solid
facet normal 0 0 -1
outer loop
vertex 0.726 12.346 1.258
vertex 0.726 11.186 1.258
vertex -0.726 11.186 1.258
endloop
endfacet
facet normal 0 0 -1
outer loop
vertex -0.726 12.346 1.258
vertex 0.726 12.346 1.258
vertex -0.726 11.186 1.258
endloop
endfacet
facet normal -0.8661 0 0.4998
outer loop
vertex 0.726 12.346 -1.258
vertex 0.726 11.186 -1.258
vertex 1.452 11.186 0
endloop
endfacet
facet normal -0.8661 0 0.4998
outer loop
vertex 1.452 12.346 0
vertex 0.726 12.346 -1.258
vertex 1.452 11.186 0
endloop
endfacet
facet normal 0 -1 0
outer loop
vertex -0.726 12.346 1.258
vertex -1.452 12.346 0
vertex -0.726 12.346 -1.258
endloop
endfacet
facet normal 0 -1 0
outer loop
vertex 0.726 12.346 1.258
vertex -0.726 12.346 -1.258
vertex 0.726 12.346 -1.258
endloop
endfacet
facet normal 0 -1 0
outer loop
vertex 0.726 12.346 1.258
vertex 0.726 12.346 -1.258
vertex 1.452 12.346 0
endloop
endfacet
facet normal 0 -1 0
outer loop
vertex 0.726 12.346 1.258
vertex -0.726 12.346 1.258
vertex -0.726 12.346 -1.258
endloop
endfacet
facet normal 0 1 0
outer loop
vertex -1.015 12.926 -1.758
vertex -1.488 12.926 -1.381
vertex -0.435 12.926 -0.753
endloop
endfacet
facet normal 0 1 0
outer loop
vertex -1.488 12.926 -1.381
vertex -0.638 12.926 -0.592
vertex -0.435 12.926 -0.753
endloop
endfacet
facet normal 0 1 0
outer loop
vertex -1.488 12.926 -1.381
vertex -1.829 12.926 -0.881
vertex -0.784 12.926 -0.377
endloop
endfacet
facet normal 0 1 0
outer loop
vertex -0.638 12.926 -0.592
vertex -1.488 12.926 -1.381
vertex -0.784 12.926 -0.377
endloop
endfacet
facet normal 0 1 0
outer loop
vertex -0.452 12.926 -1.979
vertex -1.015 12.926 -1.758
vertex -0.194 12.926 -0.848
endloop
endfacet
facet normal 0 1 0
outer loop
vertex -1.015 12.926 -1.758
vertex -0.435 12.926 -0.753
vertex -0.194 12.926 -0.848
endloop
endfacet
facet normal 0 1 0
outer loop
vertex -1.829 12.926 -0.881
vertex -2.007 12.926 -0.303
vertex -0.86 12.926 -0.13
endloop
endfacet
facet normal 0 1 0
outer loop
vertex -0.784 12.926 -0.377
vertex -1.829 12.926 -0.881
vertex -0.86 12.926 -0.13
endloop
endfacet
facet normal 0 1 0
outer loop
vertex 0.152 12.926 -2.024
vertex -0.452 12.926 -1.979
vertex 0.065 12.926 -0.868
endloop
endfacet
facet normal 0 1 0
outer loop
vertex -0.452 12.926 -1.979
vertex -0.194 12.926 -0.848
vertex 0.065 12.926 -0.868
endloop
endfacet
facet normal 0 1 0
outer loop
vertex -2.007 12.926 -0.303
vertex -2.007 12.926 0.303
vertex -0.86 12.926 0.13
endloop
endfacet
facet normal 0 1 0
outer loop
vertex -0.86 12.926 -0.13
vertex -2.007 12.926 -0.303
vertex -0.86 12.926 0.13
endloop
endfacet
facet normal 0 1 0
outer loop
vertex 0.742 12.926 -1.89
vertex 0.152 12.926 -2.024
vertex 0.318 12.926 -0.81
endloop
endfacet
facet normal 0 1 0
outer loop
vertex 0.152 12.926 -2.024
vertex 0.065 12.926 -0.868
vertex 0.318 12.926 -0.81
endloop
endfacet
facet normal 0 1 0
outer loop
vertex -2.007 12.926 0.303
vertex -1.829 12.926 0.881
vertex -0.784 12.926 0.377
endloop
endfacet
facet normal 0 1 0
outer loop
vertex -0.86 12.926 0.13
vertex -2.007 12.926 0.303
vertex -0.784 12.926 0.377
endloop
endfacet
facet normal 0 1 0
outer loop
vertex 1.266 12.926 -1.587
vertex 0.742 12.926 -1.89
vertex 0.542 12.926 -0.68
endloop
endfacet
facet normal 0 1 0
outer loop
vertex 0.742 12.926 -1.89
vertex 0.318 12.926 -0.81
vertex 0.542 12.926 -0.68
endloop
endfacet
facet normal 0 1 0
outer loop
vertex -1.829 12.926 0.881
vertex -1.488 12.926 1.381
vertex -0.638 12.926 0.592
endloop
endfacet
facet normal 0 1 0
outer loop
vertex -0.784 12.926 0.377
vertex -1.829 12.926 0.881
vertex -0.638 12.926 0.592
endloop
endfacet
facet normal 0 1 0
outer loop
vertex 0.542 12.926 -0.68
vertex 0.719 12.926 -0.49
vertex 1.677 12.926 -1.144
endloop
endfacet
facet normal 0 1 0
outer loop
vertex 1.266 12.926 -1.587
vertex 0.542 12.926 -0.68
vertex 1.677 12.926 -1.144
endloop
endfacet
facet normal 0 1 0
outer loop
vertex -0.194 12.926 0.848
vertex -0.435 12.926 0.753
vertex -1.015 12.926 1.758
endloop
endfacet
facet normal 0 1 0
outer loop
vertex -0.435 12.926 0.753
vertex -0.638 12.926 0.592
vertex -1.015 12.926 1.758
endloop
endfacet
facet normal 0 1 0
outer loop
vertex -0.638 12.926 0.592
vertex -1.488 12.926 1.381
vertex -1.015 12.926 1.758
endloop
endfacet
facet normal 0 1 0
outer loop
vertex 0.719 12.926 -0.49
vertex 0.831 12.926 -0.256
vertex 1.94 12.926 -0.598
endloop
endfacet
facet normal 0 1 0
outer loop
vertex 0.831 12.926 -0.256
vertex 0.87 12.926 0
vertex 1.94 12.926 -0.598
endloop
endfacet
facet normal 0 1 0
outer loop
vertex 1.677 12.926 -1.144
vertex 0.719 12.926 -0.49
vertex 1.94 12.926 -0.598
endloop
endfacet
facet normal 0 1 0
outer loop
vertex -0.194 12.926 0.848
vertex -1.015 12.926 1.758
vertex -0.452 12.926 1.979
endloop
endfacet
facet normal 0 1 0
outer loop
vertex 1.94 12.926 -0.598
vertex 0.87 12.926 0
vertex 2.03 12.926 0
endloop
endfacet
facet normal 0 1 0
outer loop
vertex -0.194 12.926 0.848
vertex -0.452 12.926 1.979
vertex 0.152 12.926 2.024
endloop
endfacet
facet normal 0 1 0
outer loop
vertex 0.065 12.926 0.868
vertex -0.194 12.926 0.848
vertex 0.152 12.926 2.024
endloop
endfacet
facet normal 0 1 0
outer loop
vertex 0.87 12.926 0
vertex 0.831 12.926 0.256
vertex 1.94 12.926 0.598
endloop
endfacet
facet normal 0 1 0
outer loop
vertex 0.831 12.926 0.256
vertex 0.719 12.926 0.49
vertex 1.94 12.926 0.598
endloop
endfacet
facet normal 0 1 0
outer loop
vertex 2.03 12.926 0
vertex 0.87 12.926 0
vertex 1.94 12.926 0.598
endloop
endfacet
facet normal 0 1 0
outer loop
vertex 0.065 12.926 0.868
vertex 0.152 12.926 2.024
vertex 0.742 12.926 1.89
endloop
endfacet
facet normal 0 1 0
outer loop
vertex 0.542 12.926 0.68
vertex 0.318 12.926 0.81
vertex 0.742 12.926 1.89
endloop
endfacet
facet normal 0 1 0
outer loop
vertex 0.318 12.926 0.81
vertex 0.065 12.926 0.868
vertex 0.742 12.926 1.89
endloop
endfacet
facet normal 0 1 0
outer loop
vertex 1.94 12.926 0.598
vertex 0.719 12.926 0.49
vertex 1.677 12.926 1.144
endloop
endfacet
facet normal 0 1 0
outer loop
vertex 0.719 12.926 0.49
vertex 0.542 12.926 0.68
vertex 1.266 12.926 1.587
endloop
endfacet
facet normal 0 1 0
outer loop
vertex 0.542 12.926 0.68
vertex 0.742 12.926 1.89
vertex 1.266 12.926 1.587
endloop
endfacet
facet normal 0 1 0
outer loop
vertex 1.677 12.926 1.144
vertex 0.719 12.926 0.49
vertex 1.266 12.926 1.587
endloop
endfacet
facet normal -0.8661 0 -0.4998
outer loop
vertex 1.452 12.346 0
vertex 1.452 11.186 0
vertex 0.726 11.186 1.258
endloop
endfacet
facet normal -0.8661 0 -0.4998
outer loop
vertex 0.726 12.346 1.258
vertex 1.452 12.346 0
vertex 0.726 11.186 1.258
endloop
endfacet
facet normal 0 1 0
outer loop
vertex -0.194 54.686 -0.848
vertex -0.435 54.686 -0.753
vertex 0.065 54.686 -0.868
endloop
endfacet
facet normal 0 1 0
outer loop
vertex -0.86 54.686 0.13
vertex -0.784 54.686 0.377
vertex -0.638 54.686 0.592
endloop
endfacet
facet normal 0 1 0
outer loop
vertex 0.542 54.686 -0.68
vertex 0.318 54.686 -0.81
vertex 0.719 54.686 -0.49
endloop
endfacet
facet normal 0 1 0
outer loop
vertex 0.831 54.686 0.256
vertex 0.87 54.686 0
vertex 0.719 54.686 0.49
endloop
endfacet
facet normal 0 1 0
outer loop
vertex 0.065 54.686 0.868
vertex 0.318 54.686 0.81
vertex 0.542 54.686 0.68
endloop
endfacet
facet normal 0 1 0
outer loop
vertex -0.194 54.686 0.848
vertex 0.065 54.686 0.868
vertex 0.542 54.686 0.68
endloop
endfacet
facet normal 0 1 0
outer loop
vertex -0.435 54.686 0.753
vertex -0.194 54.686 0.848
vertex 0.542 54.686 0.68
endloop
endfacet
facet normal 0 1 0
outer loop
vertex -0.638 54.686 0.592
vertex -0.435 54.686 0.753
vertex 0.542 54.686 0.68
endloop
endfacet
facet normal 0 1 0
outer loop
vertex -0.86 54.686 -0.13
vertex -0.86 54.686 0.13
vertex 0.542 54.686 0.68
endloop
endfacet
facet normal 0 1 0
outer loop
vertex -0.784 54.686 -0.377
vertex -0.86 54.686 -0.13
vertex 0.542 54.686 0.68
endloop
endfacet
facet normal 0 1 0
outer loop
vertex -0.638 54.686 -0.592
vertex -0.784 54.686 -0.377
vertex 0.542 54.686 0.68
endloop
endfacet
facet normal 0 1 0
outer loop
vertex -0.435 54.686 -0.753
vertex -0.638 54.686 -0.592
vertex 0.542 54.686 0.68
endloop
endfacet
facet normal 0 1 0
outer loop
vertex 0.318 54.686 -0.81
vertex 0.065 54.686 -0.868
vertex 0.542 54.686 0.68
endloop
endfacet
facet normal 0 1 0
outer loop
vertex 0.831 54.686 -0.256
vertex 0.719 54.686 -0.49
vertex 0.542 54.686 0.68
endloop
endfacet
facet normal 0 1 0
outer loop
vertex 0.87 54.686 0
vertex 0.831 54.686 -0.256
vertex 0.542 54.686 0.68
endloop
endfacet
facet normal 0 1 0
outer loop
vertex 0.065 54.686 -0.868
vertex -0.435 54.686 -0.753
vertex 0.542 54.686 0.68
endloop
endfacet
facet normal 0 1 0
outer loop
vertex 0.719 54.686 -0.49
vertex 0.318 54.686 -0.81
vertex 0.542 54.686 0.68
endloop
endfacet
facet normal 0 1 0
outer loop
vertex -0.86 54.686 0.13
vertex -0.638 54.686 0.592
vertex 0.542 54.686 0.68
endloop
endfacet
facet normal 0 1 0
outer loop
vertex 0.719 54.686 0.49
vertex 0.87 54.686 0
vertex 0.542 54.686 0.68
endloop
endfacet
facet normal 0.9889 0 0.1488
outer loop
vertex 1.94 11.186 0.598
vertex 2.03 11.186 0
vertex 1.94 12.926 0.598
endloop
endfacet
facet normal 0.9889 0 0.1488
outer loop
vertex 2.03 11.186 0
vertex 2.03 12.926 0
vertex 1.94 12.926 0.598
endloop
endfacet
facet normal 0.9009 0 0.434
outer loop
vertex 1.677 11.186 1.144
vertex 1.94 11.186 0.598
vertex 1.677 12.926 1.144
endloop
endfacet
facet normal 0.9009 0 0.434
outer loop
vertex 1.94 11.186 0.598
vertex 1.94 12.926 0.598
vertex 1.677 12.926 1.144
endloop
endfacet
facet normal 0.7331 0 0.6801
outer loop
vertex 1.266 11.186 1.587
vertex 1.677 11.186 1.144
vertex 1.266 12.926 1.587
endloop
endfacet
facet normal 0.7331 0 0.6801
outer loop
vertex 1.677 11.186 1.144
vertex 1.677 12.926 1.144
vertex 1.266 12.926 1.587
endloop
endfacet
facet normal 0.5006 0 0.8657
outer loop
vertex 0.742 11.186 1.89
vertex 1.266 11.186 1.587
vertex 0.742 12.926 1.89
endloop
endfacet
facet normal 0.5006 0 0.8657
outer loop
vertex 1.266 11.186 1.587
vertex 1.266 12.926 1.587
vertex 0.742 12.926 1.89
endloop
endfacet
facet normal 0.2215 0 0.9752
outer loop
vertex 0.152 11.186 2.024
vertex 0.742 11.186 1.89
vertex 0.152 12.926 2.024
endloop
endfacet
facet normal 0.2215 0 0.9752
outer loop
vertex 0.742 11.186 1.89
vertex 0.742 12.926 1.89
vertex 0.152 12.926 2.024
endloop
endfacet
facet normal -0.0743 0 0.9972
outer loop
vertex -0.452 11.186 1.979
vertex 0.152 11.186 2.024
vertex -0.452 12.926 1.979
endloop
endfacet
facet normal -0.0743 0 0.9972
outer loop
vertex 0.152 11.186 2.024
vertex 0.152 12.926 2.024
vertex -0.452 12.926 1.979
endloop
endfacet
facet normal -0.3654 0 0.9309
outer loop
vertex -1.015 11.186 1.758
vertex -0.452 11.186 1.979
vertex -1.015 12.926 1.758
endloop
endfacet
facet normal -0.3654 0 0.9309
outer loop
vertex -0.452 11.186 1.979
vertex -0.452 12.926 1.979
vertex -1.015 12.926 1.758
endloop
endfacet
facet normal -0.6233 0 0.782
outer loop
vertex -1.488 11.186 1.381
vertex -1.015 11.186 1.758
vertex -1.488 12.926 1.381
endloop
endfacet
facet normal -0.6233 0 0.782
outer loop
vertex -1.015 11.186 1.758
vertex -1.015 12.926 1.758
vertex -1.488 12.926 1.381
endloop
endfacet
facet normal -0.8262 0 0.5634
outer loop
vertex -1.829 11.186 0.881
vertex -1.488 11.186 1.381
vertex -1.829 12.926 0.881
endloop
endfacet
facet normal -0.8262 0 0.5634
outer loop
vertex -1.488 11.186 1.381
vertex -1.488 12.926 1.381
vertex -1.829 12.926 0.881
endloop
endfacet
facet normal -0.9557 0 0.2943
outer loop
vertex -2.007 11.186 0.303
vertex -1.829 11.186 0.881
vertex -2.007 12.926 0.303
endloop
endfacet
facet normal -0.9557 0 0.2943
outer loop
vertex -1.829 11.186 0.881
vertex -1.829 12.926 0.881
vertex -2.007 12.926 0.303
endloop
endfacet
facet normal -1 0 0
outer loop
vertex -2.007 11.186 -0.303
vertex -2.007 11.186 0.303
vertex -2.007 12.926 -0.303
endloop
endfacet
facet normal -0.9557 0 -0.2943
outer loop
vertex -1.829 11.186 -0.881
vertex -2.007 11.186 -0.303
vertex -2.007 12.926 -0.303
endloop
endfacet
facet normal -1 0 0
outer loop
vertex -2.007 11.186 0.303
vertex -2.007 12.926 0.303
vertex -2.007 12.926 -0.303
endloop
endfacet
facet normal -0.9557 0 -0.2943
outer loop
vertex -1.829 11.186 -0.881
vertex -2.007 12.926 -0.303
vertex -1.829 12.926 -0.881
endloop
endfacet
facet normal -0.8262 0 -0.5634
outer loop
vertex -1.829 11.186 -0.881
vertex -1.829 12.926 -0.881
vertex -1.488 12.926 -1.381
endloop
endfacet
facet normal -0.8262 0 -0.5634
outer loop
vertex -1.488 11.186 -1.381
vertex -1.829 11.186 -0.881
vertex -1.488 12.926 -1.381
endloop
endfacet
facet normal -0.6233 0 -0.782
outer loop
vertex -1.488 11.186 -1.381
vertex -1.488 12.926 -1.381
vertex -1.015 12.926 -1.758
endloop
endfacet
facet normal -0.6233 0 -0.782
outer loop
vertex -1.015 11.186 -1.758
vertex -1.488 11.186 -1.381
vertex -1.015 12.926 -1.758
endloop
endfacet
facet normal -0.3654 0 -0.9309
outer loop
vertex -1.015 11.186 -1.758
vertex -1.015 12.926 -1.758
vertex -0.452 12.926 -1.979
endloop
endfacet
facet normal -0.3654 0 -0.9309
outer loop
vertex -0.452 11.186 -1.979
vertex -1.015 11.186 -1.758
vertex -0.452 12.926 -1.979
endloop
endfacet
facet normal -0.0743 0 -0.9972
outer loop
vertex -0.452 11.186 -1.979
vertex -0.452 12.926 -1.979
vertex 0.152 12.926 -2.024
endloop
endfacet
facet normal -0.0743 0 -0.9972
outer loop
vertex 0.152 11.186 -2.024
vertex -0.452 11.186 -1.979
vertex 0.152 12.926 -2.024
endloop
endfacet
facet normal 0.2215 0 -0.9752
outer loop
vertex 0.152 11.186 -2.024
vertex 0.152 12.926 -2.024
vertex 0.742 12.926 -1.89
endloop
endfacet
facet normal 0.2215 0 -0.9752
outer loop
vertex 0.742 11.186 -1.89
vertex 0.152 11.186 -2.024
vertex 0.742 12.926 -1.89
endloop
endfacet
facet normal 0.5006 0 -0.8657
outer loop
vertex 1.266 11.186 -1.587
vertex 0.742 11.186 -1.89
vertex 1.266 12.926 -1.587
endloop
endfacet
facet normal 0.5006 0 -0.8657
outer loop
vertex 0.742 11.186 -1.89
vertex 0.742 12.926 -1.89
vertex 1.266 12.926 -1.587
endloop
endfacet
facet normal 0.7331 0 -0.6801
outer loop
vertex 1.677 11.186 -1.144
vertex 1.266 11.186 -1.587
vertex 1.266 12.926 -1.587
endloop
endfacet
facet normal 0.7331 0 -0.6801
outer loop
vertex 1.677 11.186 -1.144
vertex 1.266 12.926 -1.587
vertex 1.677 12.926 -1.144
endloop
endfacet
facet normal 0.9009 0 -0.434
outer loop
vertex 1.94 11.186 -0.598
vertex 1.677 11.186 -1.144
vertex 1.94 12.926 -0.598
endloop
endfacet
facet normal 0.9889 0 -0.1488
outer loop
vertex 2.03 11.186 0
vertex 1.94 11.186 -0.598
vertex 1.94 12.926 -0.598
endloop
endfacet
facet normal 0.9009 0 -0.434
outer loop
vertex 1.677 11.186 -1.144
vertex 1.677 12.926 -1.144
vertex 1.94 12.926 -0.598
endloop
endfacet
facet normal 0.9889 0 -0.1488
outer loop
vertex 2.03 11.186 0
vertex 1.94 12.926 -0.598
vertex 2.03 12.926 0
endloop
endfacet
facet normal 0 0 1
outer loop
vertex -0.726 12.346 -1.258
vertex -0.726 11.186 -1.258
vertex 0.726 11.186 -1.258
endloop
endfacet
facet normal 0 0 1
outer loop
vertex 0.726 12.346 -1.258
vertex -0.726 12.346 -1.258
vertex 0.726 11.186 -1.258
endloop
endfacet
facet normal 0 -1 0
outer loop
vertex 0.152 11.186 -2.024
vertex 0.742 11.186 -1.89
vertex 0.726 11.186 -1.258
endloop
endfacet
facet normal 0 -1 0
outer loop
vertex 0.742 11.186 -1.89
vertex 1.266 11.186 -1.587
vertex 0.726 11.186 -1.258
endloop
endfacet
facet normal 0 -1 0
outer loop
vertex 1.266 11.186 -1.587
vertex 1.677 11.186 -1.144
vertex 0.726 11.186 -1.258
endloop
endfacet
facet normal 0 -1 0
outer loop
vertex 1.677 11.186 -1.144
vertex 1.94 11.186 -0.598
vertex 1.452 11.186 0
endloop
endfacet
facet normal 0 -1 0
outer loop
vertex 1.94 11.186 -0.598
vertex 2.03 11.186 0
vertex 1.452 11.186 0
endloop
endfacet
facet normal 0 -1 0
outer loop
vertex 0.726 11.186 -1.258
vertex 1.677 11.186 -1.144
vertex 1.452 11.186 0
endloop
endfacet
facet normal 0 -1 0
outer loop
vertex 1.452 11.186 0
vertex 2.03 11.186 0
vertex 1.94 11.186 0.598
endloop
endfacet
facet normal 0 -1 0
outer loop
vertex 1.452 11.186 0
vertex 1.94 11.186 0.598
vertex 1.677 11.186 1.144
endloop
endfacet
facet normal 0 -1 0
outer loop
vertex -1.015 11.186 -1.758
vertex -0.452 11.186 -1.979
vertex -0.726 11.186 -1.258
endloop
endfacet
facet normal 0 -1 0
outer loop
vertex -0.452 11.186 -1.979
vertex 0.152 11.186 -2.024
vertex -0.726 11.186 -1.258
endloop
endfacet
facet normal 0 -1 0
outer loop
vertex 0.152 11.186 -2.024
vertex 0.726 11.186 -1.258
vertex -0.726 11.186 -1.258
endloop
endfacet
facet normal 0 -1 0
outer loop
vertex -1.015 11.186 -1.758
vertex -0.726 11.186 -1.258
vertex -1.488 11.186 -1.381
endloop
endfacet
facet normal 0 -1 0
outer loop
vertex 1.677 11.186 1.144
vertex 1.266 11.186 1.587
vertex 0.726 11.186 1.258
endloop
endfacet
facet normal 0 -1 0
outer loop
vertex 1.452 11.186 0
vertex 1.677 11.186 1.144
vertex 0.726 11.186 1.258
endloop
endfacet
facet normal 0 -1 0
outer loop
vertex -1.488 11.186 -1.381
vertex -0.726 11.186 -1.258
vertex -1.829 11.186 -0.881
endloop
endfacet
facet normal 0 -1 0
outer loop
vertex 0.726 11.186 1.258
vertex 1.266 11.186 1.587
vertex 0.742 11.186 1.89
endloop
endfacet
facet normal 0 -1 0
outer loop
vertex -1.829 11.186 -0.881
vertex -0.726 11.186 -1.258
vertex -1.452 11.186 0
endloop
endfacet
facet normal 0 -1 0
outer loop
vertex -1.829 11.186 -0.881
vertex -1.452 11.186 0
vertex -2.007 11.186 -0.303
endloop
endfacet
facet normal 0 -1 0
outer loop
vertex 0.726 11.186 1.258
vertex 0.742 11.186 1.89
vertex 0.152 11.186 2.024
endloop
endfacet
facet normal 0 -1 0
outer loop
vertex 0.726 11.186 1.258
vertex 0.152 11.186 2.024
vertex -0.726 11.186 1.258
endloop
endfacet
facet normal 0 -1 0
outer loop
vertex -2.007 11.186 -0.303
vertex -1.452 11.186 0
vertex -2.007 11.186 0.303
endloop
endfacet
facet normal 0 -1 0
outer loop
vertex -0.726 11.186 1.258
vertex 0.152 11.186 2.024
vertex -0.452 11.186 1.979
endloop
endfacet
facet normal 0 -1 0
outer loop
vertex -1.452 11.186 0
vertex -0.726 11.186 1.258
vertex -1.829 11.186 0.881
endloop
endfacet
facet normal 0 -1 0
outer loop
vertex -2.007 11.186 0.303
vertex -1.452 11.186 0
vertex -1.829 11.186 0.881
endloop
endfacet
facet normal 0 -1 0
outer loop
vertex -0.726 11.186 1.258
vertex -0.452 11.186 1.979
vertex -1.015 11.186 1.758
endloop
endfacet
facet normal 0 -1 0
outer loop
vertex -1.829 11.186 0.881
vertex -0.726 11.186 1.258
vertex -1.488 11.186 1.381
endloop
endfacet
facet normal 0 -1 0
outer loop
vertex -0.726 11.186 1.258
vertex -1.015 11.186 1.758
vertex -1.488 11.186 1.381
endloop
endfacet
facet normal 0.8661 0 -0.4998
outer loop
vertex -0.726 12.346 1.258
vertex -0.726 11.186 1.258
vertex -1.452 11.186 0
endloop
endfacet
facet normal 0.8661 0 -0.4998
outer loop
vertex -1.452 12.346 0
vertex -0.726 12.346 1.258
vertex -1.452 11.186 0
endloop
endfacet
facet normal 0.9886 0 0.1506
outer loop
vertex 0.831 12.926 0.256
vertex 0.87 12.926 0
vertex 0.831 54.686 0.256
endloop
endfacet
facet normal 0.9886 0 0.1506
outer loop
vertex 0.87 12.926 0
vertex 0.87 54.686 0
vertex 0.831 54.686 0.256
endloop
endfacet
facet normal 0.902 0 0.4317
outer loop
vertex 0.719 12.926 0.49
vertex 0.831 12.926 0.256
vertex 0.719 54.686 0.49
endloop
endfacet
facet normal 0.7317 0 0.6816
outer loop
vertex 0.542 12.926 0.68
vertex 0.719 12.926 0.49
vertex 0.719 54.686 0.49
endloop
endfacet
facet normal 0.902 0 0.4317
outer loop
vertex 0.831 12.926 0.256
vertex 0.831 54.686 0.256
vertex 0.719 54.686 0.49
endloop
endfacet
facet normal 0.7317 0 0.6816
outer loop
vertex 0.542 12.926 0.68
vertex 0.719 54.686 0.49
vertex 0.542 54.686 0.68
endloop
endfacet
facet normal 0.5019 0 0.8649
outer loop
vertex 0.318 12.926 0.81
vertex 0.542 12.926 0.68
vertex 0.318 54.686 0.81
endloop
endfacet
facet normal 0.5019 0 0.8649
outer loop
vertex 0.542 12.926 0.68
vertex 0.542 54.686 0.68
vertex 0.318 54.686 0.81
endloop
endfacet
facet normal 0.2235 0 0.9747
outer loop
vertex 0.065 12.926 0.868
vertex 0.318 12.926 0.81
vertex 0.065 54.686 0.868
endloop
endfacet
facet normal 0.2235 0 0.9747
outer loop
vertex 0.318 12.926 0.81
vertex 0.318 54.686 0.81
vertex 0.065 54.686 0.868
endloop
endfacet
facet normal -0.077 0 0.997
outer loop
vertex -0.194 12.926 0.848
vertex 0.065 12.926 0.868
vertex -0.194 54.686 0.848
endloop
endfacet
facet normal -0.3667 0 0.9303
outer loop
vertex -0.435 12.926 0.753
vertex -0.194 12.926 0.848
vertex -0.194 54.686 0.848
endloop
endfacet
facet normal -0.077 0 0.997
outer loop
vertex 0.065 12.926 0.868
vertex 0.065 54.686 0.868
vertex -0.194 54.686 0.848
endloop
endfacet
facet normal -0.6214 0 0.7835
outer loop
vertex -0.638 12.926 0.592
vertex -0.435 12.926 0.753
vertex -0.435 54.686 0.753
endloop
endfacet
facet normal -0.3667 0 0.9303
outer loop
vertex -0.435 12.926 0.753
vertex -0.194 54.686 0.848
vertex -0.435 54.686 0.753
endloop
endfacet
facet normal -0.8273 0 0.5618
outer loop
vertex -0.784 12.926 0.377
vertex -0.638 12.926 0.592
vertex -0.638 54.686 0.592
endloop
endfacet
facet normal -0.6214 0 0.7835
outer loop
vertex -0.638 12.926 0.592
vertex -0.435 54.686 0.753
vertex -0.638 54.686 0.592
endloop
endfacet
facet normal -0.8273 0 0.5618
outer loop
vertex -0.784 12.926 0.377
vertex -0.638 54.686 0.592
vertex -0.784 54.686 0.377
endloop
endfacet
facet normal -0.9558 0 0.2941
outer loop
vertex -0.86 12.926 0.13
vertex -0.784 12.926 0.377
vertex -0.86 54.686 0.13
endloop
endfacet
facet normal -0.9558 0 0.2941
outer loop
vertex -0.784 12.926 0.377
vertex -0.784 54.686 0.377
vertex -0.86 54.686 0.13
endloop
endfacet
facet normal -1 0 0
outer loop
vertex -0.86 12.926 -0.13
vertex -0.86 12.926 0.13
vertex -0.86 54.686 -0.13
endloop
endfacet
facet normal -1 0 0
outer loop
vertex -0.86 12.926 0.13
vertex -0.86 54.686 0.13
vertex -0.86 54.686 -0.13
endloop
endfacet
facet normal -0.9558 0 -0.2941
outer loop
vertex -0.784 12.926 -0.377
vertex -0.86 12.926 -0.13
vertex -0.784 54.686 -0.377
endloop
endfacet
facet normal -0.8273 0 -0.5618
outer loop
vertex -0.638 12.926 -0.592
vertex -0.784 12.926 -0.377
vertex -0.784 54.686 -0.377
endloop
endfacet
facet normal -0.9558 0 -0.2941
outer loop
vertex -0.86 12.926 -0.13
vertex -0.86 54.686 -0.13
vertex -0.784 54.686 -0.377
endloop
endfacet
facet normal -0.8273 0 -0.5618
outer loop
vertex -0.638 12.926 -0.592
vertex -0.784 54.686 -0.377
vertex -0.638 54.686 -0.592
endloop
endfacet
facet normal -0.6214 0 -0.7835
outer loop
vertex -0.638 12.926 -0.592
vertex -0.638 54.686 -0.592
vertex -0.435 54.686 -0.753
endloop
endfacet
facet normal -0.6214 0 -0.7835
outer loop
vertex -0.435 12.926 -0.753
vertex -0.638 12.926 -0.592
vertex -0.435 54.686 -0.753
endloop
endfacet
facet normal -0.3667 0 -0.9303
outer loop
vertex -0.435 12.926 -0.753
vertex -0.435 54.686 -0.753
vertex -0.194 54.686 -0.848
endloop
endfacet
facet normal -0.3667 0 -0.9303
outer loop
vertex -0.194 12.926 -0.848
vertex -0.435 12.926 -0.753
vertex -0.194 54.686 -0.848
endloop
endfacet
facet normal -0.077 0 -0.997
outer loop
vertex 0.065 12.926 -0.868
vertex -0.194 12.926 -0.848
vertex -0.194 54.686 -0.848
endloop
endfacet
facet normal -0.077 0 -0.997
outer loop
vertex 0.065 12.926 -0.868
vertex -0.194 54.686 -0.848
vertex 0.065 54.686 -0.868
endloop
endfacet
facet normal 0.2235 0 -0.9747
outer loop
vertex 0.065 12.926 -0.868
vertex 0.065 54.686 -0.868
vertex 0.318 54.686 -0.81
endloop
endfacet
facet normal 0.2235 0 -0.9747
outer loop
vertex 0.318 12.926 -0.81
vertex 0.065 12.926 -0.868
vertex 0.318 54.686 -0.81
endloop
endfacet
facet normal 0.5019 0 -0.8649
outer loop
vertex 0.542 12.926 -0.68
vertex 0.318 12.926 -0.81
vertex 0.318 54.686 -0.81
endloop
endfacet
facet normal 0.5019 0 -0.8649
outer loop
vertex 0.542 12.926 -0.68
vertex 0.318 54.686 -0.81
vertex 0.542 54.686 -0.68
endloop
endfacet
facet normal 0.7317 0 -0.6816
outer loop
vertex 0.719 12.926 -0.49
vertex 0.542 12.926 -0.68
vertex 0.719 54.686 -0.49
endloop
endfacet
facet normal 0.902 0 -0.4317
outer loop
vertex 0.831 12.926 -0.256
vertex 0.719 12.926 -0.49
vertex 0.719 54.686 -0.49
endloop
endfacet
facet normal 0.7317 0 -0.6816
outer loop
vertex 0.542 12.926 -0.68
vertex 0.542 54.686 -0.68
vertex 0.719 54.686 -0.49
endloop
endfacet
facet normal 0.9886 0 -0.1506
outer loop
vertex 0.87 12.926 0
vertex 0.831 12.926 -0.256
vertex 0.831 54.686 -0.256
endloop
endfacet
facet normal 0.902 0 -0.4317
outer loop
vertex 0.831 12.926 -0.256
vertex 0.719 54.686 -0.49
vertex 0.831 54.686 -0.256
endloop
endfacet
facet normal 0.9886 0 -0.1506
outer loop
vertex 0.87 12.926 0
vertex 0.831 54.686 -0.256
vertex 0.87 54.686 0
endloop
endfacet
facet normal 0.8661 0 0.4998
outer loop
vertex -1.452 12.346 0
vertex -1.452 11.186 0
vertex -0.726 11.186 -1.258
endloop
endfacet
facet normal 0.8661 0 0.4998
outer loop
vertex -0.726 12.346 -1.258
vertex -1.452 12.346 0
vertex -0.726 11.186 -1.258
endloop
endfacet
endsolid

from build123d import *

# Parameters (mm, degrees)
CUT_EXTRUDE_1_DEPTH = 2
SCALE_1_SCALE       = 0.58


with BuildPart() as part:
    # 草图1 → 旋转1 (revolve)
    with BuildSketch(Plane.XY):
        Polygon((1.5, 70), (1.5, 72), (0, 72), (0, 70), (0, -3), (3.5, -3), (3.5, 0), (1.5, 0), align=None)
    revolve(axis=Axis((0, 78.762815816, 0), (0, -1, 0)))

    # 草图2 → 切除-拉伸1 (cut)
    with BuildSketch(Plane.XZ.offset(3)):
        Polygon((2.503979876, 0), (1.251989938, 2.168510183), (-1.251989938, 2.168510183), (-2.503979876, 0), (-1.251989938, -2.168510183), (1.251989938, -2.168510183), align=None)
    extrude(amount=-CUT_EXTRUDE_1_DEPTH, mode=Mode.SUBTRACT)


with BuildPart() as part_1:
    # 缩放比例1: scaled about (0, 30.776232498, 0)
    add(part.part.scale(SCALE_1_SCALE).moved(Location((0, 12.926017649, 0))))


solid = part_1.part
